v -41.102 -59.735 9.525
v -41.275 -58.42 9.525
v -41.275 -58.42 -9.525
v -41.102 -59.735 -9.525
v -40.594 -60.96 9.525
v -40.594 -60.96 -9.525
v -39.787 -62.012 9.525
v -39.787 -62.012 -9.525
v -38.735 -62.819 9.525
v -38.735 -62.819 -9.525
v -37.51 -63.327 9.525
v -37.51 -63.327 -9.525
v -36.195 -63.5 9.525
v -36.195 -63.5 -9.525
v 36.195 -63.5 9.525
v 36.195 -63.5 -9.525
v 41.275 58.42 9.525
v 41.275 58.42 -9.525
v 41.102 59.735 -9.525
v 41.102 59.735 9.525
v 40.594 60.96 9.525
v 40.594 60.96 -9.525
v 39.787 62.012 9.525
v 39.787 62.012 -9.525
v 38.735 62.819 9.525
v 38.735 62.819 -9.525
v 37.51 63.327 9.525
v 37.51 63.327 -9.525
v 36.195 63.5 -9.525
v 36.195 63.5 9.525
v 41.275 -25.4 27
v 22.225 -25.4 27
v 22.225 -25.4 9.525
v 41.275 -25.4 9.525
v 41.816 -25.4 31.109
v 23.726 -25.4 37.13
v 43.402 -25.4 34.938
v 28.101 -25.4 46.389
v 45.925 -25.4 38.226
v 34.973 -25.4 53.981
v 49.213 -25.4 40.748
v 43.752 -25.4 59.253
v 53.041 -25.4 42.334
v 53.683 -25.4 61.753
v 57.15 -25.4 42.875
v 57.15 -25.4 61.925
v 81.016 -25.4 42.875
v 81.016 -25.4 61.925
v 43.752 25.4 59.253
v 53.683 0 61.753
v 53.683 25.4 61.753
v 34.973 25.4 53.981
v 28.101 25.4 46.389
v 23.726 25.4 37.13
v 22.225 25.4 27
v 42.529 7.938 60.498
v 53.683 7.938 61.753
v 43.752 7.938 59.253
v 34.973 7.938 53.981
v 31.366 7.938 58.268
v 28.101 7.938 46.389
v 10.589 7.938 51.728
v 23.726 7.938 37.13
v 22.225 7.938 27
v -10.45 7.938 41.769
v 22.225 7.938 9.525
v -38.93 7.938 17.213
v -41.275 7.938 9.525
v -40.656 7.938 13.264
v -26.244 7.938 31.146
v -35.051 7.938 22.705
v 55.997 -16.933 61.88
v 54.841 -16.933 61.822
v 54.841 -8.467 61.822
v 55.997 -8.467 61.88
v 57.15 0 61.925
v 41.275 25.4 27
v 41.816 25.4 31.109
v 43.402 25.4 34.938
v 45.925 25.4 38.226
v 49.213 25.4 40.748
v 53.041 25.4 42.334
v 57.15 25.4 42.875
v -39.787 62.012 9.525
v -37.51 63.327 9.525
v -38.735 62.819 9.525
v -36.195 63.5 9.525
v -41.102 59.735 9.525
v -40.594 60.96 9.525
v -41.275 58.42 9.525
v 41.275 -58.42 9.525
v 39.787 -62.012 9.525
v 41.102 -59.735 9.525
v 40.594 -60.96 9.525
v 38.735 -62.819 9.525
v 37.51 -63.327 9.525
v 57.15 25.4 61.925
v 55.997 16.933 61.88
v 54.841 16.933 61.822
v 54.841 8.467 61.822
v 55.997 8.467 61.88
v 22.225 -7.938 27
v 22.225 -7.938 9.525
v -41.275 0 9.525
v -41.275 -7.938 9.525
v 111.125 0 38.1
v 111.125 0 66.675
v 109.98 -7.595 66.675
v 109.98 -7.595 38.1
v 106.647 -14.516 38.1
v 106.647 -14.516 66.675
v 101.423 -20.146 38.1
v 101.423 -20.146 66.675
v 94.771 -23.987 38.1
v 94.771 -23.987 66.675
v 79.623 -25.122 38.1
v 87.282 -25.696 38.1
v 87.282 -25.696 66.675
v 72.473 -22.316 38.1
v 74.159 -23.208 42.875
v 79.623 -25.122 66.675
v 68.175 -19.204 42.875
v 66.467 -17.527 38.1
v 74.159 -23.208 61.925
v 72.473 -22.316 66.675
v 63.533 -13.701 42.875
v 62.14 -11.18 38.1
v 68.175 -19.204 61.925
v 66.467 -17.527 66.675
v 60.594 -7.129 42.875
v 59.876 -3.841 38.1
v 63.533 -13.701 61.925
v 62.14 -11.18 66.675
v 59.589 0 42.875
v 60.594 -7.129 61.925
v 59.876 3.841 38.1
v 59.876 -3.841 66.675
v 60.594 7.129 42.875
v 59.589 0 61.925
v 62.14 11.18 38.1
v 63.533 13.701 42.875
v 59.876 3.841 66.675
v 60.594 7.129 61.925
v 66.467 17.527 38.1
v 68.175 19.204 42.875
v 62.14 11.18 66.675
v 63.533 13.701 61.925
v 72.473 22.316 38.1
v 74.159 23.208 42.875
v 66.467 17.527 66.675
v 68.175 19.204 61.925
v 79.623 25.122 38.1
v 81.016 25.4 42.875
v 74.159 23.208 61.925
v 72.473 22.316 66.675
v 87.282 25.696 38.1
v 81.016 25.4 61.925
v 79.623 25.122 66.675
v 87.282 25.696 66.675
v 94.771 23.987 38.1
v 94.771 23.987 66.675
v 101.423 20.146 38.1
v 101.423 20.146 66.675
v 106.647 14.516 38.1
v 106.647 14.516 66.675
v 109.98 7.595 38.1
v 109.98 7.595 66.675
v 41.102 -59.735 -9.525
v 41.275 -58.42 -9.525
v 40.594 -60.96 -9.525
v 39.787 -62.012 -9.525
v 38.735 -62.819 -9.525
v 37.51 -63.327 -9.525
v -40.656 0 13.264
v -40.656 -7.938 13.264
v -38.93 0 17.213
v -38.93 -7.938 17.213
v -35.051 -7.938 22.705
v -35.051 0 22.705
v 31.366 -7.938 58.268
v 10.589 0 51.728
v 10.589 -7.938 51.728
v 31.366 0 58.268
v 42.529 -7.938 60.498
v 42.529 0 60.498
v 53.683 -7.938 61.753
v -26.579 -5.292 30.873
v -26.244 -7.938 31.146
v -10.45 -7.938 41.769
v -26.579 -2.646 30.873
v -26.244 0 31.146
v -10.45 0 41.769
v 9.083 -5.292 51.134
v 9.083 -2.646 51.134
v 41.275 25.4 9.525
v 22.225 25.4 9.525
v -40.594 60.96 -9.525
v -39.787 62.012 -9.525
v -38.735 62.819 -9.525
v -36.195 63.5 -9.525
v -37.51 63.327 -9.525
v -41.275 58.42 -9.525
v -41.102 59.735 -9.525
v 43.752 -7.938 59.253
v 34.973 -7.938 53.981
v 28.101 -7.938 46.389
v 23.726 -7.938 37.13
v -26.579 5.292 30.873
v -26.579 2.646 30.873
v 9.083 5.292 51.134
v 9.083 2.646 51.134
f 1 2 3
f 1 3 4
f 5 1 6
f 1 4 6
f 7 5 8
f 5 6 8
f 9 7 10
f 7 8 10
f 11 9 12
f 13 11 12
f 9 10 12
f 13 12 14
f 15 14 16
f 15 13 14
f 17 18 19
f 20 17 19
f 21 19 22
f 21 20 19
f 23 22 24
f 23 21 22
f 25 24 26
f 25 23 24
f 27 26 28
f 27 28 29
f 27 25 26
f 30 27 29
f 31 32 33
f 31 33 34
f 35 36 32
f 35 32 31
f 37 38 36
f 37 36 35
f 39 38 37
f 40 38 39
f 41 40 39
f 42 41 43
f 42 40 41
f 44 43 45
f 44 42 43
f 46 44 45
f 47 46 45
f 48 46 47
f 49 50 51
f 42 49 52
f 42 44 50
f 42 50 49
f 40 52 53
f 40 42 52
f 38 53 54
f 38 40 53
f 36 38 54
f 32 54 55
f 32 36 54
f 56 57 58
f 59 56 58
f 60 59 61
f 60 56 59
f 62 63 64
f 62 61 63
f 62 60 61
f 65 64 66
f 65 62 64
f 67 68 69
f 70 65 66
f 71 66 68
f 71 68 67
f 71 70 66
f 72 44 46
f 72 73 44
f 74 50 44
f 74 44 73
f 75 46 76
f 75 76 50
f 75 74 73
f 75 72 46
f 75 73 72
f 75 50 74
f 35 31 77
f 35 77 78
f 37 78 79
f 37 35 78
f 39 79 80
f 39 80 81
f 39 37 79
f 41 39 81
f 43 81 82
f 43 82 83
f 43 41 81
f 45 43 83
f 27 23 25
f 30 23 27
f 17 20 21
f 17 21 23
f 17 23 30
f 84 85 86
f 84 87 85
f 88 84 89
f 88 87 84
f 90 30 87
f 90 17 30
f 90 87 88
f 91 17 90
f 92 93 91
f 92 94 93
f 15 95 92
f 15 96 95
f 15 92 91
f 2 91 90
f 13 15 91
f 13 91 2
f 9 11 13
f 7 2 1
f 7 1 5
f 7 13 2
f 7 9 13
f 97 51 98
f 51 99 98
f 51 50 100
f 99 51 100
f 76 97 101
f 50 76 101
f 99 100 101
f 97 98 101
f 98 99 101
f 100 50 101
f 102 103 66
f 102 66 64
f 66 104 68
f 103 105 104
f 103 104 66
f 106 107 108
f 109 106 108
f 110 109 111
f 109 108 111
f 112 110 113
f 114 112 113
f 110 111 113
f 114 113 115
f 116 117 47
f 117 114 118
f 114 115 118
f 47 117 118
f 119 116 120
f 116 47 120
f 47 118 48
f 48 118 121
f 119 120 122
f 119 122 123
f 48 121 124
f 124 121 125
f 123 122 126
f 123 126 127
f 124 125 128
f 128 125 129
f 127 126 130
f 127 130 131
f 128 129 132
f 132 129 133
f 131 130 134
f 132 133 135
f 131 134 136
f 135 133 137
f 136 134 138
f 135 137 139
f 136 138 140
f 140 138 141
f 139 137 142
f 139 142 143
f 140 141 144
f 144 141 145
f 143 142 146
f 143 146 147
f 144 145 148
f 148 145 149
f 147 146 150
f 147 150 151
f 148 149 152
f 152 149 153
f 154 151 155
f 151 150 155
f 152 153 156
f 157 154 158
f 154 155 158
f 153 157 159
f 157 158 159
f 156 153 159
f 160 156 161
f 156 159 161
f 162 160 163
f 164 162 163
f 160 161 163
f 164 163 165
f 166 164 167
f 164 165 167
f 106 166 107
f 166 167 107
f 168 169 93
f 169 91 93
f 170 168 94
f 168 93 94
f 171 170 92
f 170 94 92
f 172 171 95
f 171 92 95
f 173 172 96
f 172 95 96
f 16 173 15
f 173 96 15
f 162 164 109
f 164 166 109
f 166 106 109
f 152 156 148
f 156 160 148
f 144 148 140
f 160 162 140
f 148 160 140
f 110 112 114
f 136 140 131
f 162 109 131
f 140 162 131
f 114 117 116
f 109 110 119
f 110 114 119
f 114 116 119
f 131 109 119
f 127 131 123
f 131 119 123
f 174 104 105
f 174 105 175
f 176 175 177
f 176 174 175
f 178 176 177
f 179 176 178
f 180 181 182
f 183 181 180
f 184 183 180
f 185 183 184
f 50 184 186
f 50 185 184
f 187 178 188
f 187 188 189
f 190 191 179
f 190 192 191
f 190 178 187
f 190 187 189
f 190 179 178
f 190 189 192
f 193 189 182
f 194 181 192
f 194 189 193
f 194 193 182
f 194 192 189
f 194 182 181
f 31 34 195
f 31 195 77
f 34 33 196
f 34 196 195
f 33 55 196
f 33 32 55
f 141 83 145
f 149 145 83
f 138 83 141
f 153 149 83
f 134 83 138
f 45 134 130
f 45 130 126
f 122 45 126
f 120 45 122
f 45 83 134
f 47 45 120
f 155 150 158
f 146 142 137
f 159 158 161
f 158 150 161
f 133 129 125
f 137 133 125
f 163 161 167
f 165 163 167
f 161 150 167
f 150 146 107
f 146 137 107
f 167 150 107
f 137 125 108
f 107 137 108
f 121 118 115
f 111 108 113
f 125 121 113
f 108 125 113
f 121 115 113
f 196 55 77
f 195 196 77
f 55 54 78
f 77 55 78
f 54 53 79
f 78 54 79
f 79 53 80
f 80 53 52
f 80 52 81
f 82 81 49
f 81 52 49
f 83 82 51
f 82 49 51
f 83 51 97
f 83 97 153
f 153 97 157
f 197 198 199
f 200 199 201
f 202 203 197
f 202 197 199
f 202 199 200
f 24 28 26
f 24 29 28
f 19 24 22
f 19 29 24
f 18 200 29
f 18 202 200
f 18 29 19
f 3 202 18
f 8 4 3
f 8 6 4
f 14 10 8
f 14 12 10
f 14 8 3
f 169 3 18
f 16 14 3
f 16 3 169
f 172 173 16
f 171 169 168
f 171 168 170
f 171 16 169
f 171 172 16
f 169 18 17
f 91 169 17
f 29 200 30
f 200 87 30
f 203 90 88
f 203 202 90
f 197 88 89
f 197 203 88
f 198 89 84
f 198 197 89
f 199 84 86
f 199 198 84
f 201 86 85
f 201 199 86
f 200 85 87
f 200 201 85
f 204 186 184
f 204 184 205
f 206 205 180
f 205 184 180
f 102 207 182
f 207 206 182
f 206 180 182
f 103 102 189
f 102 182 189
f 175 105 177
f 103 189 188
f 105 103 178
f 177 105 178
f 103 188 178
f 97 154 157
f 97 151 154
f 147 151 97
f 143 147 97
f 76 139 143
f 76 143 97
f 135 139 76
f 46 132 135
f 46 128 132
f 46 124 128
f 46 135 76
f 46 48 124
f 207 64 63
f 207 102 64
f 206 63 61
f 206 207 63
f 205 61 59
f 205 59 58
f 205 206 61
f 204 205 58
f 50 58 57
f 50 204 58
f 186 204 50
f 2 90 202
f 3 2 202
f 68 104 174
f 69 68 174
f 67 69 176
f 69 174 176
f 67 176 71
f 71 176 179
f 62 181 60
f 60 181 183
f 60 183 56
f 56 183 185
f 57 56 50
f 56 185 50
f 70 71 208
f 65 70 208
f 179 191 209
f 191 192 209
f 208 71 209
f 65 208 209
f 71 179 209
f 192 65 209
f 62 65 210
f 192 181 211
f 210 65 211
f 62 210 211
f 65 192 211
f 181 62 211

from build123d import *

# Parameters (mm, degrees)
F1_DEPTH = 63.5
F0_W     = 25.0318205603
F0_H     = 19.05
F2_DEPTH = 25.4
F3_DEPTH = 7.9375
F4_R     = 5.08


with BuildPart() as f1:
    # F0 (on Front) → F1 (new body, symmetric)
    with BuildSketch(Plane.XZ):
        Polygon((22.225, 9.525), (-41.275, 9.525), (-41.275, -9.525), (41.275, -9.525), (41.275, 9.525), align=None)
    extrude(amount=F1_DEPTH, both=True)

    # F4
    f4_edges = [f1.edges().sort_by_distance(p)[0] for p in [
        (-41.275, -63.5, 0),
        (41.275, -63.5, 0),
        (-41.275, 63.5, 0),
        (41.275, 63.5, 0),
    ]]
    fillet(f4_edges, radius=F4_R)


with BuildPart() as f2:
    # F0 (on Front) → F2 (new body, symmetric)
    with BuildSketch(Plane.XZ):
        with BuildLine():
            Line((22.225, 27.0002), (22.225, 9.525))
            Line((22.225, 9.525), (41.275, 9.525))
            Line((41.275, 9.525), (41.275, 27.0002))
            ThreePointArc((41.275, 27.0002), (45.9246798487, 38.2255201513), (57.15, 42.8752))
            Line((57.15, 42.8752), (60.325, 42.8752))
            Line((60.325, 42.8752), (60.325, 61.9252))
            Line((60.325, 61.9252), (57.15, 61.9252))
            add(Edge.make_bspline(
                [(53.6827884469, 61.7526685317), (54.8418998381, 61.8284588956), (55.9979441358, 61.8861878058), (57.15, 61.9252)],
                knots=[108.7081177701, 108.7081177701, 108.7081177701, 108.7081177701, 111.5045361635, 111.5045361635, 111.5045361635, 111.5045361635], degree=3))
            ThreePointArc((53.6827884469, 61.7526685317), (31.2574529209, 50.4380247872), (22.225, 27.0002))
        make_face()
        with Locations((72.8409102801, 52.4002)):
            Rectangle(F0_W, F0_H)
    extrude(amount=F2_DEPTH, both=True)

    # F0 (on Front) → F5 (revolve)
    with BuildSketch(Plane.XZ):
        Polygon((85.3568205603, 66.675), (85.3568205603, 61.9252), (85.3568205603, 42.8752), (85.3568205603, 38.1), (111.125, 38.1), (111.125, 66.675), align=None)
    revolve(axis=Axis((85.3568205603, 0, 52.3875), (0, 0, -1)))


with BuildPart() as f3:
    # F0 (on Front) → F3 (new body, symmetric)
    with BuildSketch(Plane.XZ):
        with BuildLine():
            add(Edge.make_bspline(
                [(-41.275, 9.525), (-41.0708948928, 28.5657864577), (8.6234304043, 58.8063898828), (53.6827884469, 61.7526685317)],
                knots=[0, 0, 0, 0, 108.7081177701, 108.7081177701, 108.7081177701, 108.7081177701], degree=3))
            Line((-41.275, 9.525), (22.225, 9.525))
            Line((22.225, 9.525), (22.225, 27.0002))
            ThreePointArc((22.225, 27.0002), (31.2574529209, 50.4380247872), (53.6827884469, 61.7526685317))
        make_face()
    extrude(amount=F3_DEPTH, both=True)


solid = Compound([f1.part, f2.part, f3.part])
